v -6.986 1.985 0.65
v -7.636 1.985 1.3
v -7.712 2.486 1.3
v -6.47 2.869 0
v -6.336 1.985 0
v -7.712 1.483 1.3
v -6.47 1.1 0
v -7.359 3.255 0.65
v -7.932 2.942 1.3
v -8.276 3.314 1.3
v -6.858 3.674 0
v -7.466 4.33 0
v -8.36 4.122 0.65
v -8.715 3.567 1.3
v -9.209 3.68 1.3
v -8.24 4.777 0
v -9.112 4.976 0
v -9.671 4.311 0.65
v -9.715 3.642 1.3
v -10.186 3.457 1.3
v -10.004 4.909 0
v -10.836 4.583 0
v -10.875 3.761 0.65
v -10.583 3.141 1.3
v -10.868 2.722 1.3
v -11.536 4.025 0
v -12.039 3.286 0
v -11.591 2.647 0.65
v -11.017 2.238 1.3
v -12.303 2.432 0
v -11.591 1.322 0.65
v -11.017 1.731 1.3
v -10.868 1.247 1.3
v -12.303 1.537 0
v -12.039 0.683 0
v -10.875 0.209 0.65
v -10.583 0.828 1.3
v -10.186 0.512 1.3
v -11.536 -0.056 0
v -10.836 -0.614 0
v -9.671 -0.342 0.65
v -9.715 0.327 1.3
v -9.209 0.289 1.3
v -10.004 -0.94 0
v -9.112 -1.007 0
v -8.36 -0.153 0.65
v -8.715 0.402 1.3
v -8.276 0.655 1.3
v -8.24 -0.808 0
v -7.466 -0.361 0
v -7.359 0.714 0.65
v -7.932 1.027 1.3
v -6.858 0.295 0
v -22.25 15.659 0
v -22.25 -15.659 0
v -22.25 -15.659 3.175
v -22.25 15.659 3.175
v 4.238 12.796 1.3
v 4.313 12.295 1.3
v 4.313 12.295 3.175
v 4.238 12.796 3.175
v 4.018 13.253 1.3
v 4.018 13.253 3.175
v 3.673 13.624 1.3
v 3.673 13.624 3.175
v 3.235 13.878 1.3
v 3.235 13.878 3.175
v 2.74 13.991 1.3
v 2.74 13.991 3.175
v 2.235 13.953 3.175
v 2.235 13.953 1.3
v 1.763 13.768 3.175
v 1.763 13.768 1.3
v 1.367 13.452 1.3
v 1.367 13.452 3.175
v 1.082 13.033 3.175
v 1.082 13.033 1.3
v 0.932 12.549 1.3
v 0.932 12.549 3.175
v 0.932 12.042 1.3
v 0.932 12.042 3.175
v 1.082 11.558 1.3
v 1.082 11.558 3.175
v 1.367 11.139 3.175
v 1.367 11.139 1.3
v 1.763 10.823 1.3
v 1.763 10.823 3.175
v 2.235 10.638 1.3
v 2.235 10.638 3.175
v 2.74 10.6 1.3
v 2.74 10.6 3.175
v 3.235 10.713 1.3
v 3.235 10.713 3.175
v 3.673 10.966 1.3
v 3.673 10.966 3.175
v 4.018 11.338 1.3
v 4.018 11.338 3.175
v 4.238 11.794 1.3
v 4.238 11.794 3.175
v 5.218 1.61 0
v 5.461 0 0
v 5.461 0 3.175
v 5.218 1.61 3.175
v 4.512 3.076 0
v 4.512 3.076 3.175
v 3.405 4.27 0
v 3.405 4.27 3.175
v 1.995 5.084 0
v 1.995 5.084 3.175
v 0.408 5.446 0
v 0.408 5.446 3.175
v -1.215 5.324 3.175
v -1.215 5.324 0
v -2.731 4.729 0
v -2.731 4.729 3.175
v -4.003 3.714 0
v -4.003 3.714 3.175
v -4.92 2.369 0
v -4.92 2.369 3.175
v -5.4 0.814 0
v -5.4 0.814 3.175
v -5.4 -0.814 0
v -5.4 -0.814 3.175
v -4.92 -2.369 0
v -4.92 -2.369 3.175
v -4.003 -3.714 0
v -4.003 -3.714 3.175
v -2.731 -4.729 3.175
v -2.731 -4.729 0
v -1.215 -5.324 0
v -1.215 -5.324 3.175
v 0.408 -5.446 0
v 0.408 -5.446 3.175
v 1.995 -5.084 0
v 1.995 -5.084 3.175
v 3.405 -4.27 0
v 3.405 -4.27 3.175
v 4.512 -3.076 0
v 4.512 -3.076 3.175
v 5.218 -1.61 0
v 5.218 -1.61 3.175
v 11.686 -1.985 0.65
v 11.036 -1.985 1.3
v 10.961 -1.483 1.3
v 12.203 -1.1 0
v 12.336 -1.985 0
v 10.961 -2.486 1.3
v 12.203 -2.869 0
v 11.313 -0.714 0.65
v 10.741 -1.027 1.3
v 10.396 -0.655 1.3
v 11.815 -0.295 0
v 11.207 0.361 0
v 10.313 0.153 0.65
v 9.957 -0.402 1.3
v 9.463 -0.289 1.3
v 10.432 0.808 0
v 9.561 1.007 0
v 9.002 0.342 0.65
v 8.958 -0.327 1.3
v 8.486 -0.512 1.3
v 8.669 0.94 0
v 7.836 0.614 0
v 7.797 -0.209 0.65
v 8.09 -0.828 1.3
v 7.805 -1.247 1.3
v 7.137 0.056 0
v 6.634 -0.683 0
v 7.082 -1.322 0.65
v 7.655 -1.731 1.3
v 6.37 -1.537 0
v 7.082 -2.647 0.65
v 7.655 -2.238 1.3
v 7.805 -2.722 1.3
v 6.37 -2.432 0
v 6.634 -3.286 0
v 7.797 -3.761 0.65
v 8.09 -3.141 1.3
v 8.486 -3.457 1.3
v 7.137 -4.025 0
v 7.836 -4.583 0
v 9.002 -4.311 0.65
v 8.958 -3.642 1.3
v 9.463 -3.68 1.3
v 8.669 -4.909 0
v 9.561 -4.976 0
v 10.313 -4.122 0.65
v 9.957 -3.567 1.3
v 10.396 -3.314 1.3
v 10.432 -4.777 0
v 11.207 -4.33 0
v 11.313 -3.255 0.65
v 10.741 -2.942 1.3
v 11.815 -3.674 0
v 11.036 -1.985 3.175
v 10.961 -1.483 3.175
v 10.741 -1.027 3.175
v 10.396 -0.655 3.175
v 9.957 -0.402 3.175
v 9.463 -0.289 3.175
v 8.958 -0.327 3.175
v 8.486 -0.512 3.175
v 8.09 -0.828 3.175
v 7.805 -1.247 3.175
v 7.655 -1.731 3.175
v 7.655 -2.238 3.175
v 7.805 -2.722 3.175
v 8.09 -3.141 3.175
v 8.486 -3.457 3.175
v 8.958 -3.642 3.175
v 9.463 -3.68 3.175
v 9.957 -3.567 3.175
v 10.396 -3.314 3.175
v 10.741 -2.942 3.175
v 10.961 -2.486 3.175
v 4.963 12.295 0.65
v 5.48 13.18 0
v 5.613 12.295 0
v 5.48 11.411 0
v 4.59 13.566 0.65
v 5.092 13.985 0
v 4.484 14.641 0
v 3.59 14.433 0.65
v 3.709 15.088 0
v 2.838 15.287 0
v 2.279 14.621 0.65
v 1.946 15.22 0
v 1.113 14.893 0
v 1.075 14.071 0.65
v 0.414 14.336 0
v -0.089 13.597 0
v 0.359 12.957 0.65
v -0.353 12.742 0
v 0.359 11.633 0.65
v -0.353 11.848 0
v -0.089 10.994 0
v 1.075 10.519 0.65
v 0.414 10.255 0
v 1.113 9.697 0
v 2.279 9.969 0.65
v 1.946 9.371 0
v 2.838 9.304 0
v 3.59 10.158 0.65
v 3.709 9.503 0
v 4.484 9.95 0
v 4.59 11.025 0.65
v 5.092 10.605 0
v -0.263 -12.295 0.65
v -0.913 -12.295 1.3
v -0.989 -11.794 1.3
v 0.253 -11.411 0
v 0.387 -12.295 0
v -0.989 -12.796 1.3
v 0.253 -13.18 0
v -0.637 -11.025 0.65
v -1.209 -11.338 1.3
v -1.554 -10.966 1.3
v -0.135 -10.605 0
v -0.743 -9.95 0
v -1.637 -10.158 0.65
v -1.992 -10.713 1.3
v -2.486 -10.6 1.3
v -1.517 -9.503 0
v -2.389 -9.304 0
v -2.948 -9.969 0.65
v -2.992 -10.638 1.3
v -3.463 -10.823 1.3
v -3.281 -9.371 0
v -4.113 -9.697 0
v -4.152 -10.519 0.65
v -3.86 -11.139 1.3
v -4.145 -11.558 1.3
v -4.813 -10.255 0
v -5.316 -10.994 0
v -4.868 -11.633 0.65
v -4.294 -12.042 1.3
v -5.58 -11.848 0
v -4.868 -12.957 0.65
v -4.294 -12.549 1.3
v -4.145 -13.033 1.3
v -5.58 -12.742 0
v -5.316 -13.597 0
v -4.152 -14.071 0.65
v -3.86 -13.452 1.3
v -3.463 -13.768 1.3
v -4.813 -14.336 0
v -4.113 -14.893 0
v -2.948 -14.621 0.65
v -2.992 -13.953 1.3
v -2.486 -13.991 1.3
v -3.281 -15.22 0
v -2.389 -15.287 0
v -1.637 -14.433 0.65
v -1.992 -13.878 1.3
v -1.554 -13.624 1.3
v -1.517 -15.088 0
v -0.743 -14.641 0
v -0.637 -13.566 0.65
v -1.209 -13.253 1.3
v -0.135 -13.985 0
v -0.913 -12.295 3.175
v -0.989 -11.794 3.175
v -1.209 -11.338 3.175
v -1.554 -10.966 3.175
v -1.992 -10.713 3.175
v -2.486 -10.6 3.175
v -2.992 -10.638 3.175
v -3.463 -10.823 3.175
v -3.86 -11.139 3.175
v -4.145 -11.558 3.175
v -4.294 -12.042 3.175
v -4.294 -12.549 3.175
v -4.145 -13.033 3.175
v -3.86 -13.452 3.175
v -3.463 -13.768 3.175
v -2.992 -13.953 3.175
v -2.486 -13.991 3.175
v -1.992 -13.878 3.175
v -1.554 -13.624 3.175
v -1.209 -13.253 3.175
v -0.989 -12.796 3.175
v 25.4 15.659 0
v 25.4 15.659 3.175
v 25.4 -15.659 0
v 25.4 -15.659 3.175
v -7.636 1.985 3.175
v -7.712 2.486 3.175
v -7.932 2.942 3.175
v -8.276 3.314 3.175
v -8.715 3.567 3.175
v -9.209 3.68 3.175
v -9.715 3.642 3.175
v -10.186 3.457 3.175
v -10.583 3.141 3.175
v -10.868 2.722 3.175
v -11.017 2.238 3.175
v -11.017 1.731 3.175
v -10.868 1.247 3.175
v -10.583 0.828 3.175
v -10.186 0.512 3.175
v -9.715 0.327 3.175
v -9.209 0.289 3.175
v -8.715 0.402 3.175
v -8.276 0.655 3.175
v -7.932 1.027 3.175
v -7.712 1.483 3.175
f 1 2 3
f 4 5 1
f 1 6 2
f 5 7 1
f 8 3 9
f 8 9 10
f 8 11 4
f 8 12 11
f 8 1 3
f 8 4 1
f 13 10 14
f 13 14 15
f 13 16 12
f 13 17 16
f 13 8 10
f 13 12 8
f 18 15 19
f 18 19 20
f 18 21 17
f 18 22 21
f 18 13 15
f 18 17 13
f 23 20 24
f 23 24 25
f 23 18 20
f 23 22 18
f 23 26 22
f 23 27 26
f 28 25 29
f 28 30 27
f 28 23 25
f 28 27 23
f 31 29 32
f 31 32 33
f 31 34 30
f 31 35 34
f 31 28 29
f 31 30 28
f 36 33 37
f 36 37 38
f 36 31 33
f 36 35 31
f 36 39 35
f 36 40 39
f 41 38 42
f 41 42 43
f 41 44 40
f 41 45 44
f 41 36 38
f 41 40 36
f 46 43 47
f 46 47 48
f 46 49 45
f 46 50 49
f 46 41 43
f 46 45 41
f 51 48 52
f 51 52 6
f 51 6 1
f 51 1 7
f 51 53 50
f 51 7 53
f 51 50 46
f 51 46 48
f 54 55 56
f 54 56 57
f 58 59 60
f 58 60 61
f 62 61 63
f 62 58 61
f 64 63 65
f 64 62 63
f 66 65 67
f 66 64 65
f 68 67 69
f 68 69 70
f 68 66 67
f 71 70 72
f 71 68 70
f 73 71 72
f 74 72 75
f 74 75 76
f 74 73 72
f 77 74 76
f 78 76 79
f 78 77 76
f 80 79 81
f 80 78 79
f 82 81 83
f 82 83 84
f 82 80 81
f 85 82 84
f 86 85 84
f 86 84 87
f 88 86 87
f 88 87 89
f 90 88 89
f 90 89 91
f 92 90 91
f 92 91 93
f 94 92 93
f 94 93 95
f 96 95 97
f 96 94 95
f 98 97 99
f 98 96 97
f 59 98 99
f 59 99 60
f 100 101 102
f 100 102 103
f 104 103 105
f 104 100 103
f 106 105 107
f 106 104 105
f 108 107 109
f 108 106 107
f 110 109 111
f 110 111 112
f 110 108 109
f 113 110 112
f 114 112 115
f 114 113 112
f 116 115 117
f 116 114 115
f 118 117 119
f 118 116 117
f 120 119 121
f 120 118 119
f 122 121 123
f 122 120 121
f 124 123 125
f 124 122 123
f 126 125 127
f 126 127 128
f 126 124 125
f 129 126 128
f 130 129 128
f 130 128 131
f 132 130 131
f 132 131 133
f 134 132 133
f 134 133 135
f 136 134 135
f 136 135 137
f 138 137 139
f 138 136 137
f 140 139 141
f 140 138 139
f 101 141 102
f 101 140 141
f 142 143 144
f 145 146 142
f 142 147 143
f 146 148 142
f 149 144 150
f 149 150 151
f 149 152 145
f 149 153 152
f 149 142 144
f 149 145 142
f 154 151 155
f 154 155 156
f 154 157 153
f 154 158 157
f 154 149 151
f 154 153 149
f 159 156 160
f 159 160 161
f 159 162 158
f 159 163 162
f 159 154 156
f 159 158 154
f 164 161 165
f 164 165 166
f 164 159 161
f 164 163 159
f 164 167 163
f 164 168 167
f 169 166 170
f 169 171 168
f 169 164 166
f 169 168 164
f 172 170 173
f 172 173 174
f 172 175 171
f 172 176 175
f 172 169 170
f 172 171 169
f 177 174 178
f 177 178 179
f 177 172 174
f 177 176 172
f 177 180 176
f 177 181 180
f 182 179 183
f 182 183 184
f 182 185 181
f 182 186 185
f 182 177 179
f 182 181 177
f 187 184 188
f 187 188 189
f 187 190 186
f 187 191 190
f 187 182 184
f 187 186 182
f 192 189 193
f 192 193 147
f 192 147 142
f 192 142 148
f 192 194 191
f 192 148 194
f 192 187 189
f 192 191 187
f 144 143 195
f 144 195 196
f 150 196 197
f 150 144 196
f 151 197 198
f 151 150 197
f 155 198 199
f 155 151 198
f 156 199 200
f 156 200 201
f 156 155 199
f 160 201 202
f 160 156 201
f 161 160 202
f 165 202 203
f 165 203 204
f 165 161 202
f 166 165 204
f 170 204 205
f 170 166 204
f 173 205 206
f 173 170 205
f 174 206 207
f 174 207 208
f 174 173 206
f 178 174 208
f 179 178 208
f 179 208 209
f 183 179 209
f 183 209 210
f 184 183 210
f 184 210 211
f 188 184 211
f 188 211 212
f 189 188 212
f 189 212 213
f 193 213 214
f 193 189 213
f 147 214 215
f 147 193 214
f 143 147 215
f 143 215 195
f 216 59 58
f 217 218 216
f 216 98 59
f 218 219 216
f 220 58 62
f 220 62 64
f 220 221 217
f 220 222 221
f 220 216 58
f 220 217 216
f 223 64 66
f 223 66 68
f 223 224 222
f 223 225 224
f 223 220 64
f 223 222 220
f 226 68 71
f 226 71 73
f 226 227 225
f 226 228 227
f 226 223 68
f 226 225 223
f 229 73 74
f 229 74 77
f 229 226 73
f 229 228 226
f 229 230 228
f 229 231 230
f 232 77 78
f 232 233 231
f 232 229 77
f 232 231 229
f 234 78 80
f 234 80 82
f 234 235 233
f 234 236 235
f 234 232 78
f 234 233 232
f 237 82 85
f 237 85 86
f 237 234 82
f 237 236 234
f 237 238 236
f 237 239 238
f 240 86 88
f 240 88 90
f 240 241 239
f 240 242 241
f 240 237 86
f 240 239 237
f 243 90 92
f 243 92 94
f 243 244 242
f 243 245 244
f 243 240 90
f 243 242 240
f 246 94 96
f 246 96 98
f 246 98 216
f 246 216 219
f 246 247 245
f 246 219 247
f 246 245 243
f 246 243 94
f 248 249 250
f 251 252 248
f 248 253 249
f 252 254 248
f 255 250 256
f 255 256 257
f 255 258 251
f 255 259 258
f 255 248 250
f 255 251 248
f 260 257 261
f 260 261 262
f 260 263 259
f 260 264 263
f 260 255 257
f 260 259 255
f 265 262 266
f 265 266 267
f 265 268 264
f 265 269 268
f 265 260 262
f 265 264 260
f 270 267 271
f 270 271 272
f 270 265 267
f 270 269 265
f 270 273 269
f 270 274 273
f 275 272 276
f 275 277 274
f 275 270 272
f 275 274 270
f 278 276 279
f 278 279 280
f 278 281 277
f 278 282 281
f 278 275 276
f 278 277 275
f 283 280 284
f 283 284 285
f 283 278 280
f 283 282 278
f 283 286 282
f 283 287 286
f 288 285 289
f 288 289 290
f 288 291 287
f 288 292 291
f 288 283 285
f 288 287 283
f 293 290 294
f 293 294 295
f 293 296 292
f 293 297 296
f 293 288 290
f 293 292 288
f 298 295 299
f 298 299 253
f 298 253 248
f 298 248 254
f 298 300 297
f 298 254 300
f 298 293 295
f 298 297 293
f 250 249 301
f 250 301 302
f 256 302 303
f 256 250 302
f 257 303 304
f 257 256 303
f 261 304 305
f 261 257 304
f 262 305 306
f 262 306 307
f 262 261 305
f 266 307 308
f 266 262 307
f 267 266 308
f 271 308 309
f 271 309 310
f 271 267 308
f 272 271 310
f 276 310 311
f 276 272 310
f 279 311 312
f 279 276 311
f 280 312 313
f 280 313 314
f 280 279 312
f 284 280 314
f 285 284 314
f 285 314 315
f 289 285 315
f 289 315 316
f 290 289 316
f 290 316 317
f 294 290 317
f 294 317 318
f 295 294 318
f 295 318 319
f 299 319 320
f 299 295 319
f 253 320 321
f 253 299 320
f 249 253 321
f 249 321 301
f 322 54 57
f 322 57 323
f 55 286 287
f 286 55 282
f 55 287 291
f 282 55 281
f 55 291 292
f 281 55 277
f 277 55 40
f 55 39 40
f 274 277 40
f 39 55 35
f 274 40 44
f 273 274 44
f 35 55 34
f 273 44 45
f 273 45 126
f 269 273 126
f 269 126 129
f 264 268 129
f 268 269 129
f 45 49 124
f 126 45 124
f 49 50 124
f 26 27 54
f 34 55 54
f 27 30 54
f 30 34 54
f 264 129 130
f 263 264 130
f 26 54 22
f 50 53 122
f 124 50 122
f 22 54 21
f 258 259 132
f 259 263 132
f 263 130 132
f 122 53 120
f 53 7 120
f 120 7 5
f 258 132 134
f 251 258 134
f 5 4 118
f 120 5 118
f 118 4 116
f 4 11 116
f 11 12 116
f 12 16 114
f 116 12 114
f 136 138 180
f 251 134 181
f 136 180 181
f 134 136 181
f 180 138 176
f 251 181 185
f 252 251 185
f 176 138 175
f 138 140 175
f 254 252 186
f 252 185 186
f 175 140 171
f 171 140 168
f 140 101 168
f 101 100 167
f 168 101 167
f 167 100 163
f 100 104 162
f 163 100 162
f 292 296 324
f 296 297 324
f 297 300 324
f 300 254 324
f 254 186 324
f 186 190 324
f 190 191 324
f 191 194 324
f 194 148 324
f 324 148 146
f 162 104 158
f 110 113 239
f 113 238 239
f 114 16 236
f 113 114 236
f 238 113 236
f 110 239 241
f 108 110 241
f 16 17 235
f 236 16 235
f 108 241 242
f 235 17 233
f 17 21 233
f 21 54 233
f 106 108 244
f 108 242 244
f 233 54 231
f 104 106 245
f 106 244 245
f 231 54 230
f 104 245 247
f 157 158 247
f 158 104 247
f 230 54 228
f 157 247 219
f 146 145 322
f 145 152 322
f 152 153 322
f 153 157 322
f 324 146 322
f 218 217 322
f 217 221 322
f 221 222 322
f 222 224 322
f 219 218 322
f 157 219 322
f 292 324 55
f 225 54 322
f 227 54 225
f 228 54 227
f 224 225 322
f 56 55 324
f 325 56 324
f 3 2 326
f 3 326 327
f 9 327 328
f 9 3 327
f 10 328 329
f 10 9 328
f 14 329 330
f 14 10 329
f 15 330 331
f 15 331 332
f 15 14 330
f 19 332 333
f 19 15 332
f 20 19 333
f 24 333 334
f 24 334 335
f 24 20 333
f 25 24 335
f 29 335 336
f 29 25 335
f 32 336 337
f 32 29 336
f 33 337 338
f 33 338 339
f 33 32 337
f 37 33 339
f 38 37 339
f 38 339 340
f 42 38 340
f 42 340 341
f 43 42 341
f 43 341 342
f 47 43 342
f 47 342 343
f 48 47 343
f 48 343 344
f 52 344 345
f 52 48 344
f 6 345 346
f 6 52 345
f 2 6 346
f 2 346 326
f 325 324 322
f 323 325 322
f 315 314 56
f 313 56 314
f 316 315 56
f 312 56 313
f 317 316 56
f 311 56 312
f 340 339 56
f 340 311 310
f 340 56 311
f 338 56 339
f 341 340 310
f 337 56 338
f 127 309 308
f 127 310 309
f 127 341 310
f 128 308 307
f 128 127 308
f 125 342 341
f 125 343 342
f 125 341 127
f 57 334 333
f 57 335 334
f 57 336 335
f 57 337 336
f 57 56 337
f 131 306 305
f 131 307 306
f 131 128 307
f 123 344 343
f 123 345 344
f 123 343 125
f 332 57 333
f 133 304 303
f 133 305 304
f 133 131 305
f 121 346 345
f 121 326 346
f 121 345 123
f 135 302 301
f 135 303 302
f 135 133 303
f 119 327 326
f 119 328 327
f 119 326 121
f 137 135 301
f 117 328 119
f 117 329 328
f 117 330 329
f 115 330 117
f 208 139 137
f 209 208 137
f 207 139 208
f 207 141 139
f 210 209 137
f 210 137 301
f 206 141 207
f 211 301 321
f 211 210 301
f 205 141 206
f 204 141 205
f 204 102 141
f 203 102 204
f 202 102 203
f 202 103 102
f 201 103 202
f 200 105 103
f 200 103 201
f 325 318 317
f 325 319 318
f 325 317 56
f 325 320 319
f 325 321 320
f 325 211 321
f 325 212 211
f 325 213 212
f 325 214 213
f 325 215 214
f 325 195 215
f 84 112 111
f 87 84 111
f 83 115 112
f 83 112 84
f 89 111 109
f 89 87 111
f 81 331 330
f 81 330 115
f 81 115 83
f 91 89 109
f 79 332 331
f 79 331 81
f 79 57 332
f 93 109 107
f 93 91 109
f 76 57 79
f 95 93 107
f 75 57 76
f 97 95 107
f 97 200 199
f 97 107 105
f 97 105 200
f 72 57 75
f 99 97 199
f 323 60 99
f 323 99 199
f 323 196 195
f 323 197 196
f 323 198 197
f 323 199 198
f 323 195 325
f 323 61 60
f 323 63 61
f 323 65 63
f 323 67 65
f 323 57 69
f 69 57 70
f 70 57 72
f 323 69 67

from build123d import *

# Parameters (mm, degrees)
SKETCH1_W           = 47.6504
SKETCH1_H           = 31.3182
SKETCH1_R           = 1.7
SKETCH1_R_2         = 5.461
BOSS_EXTRUDE1_DEPTH = 3.175
CHAMFER1_SIZE       = 1.29999994


with BuildPart() as part:
    # Sketch1 → Boss-Extrude1 (new body)
    with BuildSketch(Plane.XY):
        with Locations((1.5748, 0)):
            Rectangle(SKETCH1_W, SKETCH1_H)
        with Locations((9.336418849, -1.984517089)):
            Circle(SKETCH1_R, mode=Mode.SUBTRACT)
        with Locations((-9.336418849, 1.984517089)):
            Circle(SKETCH1_R, mode=Mode.SUBTRACT)
        with Locations((2.613449954, 12.295315341)):
            Circle(SKETCH1_R, mode=Mode.SUBTRACT)
        with Locations((-2.613449954, -12.295315341)):
            Circle(SKETCH1_R, mode=Mode.SUBTRACT)
        Circle(SKETCH1_R_2, mode=Mode.SUBTRACT)
    extrude(amount=BOSS_EXTRUDE1_DEPTH)

    # Chamfer1
    chamfer1_edges = [part.edges().sort_by_distance(p)[0] for p in [
        (7.636418849, -1.984517089, 0),
        (-11.036418849, 1.984517089, 0),
        (0.913449954, 12.295315341, 0),
        (-4.313449954, -12.295315341, 0),
    ]]
    chamfer(chamfer1_edges, length=CHAMFER1_SIZE)


solid = part.part
